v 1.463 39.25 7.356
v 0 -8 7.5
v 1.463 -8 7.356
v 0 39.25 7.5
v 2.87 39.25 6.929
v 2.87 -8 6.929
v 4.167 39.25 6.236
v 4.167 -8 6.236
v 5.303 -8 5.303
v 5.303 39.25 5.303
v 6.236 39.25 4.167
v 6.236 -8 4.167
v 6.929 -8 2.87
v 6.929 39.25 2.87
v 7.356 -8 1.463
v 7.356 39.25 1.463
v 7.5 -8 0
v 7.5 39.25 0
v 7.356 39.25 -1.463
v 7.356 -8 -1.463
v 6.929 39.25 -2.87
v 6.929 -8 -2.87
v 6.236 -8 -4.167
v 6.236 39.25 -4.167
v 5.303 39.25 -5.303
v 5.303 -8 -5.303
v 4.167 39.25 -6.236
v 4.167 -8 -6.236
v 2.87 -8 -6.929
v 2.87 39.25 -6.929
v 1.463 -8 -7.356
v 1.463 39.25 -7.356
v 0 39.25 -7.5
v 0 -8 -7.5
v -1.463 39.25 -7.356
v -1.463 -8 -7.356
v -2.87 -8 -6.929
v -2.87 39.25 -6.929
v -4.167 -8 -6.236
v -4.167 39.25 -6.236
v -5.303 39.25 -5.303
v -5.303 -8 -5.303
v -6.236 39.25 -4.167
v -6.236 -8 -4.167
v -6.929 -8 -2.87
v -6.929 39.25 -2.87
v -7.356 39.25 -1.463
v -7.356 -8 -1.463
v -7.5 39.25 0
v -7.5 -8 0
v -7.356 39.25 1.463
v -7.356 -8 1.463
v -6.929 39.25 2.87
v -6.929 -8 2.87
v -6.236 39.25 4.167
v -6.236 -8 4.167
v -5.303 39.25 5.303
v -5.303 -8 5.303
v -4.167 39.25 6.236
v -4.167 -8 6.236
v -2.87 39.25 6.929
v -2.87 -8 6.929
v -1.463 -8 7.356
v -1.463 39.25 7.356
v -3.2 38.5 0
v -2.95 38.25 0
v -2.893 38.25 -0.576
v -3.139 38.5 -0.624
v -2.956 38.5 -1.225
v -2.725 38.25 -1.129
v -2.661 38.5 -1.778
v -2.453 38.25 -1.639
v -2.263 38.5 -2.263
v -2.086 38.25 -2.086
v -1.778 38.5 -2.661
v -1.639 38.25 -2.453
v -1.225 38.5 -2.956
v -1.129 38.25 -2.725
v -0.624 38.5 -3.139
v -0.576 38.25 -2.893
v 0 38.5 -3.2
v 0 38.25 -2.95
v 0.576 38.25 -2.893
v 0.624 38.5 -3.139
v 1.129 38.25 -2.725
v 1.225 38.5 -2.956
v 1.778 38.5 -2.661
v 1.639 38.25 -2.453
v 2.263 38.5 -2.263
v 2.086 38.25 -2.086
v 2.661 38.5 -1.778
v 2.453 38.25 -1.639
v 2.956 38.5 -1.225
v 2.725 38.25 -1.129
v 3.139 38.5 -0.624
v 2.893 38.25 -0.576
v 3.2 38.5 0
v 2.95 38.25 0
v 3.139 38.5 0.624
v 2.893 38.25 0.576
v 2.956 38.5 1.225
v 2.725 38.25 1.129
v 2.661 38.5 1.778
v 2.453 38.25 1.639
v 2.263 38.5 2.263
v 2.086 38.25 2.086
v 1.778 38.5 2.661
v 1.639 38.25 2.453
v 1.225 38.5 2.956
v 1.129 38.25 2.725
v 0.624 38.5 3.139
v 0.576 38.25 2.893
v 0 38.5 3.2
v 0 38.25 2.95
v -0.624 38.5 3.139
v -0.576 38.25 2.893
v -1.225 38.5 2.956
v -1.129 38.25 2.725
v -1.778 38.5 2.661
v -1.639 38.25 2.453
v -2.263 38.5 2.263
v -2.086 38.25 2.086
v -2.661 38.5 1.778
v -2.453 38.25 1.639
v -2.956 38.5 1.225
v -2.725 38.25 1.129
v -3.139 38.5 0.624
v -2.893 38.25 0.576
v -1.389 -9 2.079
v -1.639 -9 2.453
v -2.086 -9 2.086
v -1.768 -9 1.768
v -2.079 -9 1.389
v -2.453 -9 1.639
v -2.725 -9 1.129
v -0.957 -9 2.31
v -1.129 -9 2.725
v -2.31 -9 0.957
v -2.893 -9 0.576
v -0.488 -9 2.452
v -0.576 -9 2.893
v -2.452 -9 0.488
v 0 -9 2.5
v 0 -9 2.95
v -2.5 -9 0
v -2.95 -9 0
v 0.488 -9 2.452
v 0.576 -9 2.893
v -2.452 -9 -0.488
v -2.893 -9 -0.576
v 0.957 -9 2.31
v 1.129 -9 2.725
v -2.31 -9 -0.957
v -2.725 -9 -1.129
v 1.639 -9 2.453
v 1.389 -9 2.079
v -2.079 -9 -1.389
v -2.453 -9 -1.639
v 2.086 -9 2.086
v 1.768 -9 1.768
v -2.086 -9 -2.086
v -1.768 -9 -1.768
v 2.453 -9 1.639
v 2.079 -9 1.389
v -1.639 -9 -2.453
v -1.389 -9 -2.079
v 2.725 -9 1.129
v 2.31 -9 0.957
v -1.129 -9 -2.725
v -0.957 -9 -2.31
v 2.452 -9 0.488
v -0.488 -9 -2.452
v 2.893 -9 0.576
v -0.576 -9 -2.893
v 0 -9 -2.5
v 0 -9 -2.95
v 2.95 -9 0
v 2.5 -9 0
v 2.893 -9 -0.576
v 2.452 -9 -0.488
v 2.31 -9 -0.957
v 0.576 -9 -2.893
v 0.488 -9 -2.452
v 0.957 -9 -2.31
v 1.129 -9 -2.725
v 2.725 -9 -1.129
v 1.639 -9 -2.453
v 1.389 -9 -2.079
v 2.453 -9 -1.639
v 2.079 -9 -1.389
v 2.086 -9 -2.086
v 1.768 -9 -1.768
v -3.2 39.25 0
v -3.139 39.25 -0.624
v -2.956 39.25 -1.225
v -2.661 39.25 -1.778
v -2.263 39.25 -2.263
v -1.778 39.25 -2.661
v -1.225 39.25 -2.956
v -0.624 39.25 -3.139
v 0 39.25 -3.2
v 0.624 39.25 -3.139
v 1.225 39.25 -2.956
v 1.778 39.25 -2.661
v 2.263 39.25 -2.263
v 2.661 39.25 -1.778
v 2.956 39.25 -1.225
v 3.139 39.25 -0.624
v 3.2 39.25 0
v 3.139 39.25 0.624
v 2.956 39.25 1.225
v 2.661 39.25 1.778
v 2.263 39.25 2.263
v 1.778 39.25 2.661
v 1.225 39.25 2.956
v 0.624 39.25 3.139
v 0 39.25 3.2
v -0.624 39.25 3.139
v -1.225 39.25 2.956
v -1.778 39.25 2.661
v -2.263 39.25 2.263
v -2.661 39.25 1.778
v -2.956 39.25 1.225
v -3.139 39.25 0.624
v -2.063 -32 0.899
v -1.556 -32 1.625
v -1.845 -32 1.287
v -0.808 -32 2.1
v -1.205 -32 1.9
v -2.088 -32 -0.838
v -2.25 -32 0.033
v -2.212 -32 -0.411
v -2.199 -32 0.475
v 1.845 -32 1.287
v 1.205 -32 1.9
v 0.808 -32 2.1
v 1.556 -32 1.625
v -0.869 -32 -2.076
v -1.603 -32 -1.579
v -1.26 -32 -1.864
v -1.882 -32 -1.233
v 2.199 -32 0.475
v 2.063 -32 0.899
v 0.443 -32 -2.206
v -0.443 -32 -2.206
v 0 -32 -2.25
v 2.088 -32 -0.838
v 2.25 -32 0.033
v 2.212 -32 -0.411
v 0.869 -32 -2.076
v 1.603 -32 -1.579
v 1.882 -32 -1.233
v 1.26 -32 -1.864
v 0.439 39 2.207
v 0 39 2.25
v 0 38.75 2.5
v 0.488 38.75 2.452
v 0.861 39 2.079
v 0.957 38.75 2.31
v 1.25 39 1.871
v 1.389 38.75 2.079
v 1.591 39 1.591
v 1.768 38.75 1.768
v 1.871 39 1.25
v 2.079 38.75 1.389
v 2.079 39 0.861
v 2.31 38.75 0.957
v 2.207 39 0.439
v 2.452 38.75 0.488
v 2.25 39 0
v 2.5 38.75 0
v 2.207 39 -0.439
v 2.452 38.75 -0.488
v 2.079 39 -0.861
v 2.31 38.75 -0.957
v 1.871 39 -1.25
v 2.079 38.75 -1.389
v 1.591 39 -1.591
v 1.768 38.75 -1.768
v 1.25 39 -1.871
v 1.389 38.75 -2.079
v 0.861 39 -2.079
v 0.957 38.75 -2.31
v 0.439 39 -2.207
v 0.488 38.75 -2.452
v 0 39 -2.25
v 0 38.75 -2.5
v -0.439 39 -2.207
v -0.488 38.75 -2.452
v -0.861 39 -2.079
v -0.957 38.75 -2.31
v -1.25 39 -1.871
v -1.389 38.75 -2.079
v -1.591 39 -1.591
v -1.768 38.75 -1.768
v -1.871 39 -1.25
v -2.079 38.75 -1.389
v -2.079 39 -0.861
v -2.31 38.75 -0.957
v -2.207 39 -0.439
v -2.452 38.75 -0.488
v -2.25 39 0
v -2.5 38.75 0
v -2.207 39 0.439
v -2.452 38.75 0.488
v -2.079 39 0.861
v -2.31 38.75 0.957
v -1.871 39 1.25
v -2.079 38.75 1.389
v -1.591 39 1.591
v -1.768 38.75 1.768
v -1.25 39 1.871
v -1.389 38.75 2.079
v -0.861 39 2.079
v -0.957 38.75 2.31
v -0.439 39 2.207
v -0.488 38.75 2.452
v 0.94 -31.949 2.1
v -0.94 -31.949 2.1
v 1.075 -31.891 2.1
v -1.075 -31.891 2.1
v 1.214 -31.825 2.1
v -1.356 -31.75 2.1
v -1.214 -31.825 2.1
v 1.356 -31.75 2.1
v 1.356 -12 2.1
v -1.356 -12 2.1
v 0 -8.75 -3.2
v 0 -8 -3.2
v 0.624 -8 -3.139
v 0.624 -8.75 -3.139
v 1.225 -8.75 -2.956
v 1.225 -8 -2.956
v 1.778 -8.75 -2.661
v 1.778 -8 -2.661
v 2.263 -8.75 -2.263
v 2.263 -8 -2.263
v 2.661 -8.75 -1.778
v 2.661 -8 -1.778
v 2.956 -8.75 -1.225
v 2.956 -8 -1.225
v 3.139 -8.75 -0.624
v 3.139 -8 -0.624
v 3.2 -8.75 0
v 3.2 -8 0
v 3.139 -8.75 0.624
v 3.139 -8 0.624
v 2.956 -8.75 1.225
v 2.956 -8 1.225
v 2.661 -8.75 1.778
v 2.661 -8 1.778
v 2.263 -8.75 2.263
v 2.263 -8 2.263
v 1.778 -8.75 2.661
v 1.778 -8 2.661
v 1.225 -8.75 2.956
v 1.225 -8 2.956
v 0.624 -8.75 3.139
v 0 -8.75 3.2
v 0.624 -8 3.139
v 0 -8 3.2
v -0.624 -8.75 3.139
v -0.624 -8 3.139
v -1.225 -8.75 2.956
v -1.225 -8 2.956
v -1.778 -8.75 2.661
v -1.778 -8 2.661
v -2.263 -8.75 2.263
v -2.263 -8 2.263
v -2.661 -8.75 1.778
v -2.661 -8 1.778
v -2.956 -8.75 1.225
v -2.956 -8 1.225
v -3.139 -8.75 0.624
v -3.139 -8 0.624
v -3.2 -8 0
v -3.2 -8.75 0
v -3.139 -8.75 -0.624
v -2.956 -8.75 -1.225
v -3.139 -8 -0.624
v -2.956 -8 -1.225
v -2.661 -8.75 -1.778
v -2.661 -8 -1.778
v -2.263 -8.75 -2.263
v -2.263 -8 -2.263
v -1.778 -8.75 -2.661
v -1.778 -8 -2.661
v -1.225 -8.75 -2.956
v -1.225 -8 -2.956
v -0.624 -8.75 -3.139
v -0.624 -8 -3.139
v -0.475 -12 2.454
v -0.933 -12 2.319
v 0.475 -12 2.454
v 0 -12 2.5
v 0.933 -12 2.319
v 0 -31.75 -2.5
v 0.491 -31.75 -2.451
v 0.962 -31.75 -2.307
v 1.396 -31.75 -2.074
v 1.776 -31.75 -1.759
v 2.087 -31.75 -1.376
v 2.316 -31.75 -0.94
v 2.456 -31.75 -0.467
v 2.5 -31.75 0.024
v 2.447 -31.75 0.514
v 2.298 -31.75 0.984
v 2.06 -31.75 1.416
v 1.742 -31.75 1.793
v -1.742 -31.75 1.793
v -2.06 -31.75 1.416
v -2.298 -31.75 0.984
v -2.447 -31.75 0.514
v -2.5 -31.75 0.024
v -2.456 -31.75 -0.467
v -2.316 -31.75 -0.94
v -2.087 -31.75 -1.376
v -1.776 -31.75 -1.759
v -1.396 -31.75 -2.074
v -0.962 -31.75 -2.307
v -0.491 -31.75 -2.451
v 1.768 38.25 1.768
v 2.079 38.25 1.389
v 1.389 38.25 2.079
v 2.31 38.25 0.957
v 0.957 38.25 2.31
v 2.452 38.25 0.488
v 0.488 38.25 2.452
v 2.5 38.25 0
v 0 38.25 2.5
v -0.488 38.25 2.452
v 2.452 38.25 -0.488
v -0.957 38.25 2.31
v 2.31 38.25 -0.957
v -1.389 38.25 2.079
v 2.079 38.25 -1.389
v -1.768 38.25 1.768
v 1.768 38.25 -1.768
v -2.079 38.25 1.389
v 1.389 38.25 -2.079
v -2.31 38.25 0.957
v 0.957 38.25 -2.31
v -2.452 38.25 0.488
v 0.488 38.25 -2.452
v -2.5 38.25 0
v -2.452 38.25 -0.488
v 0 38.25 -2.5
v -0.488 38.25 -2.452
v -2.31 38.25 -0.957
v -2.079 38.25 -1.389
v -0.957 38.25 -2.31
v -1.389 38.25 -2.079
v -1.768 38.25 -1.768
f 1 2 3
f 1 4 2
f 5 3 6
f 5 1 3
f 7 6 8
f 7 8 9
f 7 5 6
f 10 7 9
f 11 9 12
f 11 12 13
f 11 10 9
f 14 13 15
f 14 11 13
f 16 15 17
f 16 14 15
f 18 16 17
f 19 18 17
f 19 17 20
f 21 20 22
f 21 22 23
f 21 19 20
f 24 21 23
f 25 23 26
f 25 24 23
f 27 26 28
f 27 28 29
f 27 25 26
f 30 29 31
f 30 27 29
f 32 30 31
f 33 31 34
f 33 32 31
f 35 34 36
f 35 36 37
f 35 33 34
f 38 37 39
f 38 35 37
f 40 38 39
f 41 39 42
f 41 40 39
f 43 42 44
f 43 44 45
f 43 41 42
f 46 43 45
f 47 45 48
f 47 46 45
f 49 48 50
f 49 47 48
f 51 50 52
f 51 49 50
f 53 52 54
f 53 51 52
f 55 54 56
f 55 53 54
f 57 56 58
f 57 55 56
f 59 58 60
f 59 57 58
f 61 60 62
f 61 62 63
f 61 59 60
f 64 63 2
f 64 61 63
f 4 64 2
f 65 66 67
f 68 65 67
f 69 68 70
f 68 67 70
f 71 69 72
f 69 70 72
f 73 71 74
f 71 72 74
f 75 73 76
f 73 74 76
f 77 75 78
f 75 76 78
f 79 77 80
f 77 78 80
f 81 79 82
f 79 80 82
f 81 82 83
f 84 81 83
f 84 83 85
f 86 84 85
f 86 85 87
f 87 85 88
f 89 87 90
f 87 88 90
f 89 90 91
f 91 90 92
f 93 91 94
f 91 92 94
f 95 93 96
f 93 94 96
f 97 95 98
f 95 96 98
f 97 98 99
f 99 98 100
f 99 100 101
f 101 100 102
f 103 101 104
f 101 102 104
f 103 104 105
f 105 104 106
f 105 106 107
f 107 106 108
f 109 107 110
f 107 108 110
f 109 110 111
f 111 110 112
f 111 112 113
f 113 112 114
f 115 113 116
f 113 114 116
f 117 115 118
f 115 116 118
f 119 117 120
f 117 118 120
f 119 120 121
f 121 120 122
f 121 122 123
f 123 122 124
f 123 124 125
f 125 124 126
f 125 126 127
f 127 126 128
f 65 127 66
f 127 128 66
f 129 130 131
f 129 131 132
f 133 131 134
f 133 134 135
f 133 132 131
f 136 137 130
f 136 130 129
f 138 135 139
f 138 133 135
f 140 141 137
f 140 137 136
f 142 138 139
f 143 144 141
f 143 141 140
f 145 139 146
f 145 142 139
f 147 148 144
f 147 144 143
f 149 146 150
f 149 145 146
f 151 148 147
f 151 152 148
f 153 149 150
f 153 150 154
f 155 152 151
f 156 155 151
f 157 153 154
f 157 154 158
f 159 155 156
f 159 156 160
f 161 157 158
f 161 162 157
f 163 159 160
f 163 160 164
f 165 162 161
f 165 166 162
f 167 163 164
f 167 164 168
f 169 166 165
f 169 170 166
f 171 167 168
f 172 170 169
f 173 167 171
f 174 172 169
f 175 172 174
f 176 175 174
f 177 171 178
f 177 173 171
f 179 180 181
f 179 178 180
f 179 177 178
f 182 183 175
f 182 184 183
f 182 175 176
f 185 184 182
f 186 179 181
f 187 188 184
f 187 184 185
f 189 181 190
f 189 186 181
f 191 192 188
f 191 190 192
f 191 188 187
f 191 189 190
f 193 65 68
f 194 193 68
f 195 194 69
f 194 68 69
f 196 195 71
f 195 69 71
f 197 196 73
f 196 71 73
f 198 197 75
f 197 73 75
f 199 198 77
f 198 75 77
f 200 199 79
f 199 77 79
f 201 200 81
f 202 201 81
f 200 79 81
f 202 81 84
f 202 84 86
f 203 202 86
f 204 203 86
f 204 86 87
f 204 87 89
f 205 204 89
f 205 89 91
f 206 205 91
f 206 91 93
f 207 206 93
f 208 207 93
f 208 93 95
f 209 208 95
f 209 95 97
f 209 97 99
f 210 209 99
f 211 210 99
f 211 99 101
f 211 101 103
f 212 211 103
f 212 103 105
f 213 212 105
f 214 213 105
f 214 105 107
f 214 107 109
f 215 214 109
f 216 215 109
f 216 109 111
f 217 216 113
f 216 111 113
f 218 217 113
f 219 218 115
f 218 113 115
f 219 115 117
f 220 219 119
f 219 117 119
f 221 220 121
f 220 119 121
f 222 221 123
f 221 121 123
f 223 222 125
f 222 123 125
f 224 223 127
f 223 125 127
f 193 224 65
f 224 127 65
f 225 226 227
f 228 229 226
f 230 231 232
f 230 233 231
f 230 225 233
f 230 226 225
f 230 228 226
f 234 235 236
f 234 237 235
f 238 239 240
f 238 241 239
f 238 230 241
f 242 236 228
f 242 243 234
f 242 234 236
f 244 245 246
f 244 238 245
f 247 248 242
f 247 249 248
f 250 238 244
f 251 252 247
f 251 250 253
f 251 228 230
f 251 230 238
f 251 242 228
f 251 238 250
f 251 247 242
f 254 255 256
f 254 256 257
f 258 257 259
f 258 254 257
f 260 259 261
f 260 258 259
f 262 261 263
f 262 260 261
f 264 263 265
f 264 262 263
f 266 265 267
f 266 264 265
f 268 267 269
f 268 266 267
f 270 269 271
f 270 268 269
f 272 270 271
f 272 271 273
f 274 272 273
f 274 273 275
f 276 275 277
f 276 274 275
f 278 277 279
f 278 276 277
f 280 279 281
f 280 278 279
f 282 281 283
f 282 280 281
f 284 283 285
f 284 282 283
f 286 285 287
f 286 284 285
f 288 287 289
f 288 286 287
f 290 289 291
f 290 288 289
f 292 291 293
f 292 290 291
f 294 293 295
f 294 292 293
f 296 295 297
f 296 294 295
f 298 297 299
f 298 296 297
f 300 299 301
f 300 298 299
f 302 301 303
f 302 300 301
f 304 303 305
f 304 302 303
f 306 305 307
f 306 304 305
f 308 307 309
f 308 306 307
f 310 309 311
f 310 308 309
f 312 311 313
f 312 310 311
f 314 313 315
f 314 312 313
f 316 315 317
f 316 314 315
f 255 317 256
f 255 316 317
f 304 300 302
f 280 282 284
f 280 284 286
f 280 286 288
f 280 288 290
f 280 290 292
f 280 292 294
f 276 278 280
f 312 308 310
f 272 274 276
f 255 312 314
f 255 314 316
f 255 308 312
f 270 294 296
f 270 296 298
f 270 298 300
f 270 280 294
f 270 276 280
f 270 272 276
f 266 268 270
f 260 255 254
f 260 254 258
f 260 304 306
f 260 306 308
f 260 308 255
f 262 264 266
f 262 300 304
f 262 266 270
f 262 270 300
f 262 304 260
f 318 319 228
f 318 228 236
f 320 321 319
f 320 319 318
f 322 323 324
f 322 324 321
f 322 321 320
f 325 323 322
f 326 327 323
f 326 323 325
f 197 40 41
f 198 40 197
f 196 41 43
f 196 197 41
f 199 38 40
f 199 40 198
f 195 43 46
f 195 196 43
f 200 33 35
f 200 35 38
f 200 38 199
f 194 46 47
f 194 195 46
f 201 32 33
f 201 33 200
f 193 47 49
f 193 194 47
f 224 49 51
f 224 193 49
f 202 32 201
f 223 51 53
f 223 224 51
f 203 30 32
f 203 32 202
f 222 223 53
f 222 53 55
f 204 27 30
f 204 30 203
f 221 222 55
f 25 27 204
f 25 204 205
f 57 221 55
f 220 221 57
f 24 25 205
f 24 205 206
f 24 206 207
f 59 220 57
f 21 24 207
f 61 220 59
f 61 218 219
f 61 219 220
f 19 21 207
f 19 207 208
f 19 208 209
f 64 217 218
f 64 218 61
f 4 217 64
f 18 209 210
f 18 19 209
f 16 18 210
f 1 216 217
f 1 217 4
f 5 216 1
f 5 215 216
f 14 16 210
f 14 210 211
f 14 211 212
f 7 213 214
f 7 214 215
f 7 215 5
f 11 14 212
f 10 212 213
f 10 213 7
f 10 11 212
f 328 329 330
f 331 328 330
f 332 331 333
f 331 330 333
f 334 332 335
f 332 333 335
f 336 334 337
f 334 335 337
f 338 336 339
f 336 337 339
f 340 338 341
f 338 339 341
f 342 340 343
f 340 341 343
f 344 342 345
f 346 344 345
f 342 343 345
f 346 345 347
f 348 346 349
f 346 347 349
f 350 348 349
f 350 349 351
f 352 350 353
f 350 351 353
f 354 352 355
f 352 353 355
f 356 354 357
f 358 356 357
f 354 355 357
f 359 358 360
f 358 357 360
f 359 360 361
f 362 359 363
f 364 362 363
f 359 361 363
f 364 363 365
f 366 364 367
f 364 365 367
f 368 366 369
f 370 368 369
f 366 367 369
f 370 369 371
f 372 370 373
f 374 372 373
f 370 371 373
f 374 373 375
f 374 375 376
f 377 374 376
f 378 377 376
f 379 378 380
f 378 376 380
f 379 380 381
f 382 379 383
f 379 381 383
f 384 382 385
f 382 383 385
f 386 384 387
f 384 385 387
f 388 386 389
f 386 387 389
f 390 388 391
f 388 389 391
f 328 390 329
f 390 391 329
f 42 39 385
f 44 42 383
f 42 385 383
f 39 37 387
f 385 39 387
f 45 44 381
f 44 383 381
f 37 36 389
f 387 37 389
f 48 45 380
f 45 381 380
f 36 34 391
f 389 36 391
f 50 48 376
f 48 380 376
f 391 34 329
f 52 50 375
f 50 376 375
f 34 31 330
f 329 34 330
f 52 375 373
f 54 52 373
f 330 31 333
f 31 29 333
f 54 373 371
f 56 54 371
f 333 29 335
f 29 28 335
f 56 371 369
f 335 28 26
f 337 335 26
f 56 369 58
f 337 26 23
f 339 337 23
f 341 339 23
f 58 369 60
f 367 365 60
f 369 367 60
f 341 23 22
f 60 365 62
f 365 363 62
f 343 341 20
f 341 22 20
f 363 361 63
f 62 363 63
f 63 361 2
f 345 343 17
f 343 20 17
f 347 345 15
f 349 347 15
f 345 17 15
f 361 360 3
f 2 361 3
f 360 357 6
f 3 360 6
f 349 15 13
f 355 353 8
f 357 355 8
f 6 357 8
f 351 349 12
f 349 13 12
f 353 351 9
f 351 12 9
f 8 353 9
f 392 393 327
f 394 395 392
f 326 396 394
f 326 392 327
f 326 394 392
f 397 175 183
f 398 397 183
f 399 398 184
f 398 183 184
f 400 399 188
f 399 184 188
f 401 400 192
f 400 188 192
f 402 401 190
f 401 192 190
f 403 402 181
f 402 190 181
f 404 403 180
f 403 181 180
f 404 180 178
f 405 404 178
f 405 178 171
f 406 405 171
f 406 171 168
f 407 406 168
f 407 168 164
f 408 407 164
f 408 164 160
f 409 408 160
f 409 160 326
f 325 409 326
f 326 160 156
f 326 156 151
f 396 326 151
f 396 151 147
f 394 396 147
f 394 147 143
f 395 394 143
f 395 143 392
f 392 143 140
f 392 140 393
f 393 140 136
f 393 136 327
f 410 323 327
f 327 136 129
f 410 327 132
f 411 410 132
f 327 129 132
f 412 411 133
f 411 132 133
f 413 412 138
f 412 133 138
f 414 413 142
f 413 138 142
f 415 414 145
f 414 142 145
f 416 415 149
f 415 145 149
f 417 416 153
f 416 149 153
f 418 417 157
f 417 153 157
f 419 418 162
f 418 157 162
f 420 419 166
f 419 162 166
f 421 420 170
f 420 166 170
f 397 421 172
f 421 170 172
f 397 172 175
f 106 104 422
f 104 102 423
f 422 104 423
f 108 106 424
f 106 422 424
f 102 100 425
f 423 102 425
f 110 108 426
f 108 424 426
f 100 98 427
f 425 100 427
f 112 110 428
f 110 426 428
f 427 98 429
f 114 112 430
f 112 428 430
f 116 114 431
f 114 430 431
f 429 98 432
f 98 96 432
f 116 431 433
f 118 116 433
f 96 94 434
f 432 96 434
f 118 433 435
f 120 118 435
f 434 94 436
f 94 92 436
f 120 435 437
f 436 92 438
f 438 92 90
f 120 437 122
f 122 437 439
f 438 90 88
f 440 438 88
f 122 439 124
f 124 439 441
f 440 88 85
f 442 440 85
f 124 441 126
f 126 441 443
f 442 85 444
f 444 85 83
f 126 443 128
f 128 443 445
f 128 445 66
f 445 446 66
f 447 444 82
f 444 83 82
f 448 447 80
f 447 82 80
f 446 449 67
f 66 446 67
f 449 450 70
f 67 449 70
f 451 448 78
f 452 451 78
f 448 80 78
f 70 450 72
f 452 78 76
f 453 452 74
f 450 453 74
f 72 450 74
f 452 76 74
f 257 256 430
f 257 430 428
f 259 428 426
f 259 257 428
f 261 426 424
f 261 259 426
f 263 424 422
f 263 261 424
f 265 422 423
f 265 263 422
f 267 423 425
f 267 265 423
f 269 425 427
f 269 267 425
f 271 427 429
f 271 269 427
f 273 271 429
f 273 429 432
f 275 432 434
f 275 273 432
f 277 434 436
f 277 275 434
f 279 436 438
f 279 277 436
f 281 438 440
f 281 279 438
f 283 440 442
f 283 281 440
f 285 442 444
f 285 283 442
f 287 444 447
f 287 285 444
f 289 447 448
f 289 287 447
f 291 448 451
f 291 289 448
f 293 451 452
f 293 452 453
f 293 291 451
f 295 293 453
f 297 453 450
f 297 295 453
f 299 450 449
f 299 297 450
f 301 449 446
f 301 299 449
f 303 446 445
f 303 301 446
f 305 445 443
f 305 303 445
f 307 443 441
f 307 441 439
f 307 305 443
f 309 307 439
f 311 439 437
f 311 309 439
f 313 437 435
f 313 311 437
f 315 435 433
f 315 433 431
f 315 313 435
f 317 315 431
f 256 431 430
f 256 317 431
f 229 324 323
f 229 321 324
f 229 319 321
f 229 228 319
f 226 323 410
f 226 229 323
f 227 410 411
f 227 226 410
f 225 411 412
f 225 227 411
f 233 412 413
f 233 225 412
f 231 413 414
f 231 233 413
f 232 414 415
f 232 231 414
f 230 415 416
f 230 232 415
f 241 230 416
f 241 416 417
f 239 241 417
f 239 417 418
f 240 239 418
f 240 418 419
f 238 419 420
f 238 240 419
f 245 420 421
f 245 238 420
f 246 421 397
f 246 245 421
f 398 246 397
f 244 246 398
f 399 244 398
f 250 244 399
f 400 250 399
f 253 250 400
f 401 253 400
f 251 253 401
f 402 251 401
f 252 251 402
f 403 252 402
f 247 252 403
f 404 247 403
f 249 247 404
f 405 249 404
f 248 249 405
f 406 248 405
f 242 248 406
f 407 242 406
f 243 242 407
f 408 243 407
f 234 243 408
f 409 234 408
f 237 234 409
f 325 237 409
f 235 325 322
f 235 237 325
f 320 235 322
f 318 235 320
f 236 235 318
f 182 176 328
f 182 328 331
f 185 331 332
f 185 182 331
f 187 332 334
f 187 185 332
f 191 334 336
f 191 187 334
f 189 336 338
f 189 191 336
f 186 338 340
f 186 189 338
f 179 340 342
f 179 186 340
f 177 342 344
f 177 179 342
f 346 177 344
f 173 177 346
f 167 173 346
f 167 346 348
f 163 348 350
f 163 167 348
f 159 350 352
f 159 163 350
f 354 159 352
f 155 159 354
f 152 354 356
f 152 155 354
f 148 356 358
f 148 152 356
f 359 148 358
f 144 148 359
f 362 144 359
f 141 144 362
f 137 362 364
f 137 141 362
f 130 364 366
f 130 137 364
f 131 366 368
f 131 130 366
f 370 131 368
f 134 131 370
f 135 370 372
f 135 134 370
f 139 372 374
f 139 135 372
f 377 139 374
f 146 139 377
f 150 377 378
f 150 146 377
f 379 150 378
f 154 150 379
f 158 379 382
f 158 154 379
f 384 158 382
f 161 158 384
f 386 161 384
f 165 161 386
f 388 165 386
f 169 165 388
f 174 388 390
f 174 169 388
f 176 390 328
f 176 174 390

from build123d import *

# Parameters (mm, degrees)
CROQUIS1_W                          = 7.5
CROQUIS1_H                          = 47.25
CROQUIS2_R                          = 3.2
SALIENTE_EXTRUIR1_DEPTH             = 1
CROQUIS3_R                          = 2.5
SALIENTE_EXTRUIR2_DEPTH             = 23
CORTAR_EXTRUIR1_START               = -20
CORTAR_EXTRUIR1_DEPTH               = 20
DI_METRO_DE_TALADRO_6_4_6_4_1_D     = 6.4
DI_METRO_DE_TALADRO_6_4_6_4_1_DEPTH = 1
CROQUIS7_W                          = 2.5
CROQUIS7_H                          = 0.75
CHAFL_N1_SIZE                       = 0.25


with BuildPart() as part:
    # Croquis1 → Revolución1 (revolve)
    with BuildSketch(Plane(origin=(0, 0, 0), x_dir=(-1, 0, 0), z_dir=(0, 0, -1)), mode=Mode.PRIVATE) as revoluci_n1_sk:
        with Locations((-3.75, 15.625)):
            Rectangle(CROQUIS1_W, CROQUIS1_H)
    revolve(revoluci_n1_sk.sketch.rotate(Axis((0, -8, 0), (0, 1, 0)), 270), axis=Axis((0, -8, 0), (0, 1, 0)))

    # Croquis2 → Saliente-Extruir1 (add)
    with BuildSketch(Plane.XZ.offset(8)):
        with Locations(Location((0, 0, 0), (0, 0, 270))):
            Circle(CROQUIS2_R)
    extrude(amount=SALIENTE_EXTRUIR1_DEPTH)

    # Croquis3 → Saliente-Extruir2 (add)
    with BuildSketch(Plane.XZ.offset(9)):
        with Locations(Location((0, 0, 0), (0, 0, 270))):
            Circle(CROQUIS3_R)
    extrude(amount=SALIENTE_EXTRUIR2_DEPTH)

    # Croquis4 → Cortar-Extruir1 (cut)
    with BuildSketch(Plane.XZ.offset(32).offset(CORTAR_EXTRUIR1_START)):
        with BuildLine():
            Line((-1.356465997, 2.1), (1.356465997, 2.1))
            ThreePointArc((1.356465997, 2.1), (0, 2.5), (-1.356465997, 2.1))
        make_face()
    extrude(amount=CORTAR_EXTRUIR1_DEPTH, mode=Mode.SUBTRACT)

    # Diámetro de taladro Ø6.4 (6.4)1
    with Locations(Plane(origin=(0, 39.25, 0), x_dir=(1, 0, 0), z_dir=(0, 1, 0))):
        with Locations((0, 0)):
            Hole(DI_METRO_DE_TALADRO_6_4_6_4_1_D / 2, depth=DI_METRO_DE_TALADRO_6_4_6_4_1_DEPTH)

    # Croquis7 → Revolución2 (revolve)
    with BuildSketch(Plane(origin=(0, 0, 0), x_dir=(-1, 0, 0), z_dir=(0, 0, -1)), mode=Mode.PRIVATE) as revoluci_n2_sk:
        with Locations((-1.25, 38.625)):
            Rectangle(CROQUIS7_W, CROQUIS7_H)
    revolve(revoluci_n2_sk.sketch.rotate(Axis((0, 38.25, 0), (0, 1, 0)), 270), axis=Axis((0, 38.25, 0), (0, 1, 0)))

    # Chaflán1
    chafl_n1_edges = [part.edges().sort_by_distance(p)[0] for p in [
        (0, -9, 3.2),
        (-2.397915762, -32, -0.707106781),
        (3.2, 38.25, 0),
        (0, 39, -2.5),
    ]]
    chamfer(chafl_n1_edges, length=CHAFL_N1_SIZE)


solid = part.part
